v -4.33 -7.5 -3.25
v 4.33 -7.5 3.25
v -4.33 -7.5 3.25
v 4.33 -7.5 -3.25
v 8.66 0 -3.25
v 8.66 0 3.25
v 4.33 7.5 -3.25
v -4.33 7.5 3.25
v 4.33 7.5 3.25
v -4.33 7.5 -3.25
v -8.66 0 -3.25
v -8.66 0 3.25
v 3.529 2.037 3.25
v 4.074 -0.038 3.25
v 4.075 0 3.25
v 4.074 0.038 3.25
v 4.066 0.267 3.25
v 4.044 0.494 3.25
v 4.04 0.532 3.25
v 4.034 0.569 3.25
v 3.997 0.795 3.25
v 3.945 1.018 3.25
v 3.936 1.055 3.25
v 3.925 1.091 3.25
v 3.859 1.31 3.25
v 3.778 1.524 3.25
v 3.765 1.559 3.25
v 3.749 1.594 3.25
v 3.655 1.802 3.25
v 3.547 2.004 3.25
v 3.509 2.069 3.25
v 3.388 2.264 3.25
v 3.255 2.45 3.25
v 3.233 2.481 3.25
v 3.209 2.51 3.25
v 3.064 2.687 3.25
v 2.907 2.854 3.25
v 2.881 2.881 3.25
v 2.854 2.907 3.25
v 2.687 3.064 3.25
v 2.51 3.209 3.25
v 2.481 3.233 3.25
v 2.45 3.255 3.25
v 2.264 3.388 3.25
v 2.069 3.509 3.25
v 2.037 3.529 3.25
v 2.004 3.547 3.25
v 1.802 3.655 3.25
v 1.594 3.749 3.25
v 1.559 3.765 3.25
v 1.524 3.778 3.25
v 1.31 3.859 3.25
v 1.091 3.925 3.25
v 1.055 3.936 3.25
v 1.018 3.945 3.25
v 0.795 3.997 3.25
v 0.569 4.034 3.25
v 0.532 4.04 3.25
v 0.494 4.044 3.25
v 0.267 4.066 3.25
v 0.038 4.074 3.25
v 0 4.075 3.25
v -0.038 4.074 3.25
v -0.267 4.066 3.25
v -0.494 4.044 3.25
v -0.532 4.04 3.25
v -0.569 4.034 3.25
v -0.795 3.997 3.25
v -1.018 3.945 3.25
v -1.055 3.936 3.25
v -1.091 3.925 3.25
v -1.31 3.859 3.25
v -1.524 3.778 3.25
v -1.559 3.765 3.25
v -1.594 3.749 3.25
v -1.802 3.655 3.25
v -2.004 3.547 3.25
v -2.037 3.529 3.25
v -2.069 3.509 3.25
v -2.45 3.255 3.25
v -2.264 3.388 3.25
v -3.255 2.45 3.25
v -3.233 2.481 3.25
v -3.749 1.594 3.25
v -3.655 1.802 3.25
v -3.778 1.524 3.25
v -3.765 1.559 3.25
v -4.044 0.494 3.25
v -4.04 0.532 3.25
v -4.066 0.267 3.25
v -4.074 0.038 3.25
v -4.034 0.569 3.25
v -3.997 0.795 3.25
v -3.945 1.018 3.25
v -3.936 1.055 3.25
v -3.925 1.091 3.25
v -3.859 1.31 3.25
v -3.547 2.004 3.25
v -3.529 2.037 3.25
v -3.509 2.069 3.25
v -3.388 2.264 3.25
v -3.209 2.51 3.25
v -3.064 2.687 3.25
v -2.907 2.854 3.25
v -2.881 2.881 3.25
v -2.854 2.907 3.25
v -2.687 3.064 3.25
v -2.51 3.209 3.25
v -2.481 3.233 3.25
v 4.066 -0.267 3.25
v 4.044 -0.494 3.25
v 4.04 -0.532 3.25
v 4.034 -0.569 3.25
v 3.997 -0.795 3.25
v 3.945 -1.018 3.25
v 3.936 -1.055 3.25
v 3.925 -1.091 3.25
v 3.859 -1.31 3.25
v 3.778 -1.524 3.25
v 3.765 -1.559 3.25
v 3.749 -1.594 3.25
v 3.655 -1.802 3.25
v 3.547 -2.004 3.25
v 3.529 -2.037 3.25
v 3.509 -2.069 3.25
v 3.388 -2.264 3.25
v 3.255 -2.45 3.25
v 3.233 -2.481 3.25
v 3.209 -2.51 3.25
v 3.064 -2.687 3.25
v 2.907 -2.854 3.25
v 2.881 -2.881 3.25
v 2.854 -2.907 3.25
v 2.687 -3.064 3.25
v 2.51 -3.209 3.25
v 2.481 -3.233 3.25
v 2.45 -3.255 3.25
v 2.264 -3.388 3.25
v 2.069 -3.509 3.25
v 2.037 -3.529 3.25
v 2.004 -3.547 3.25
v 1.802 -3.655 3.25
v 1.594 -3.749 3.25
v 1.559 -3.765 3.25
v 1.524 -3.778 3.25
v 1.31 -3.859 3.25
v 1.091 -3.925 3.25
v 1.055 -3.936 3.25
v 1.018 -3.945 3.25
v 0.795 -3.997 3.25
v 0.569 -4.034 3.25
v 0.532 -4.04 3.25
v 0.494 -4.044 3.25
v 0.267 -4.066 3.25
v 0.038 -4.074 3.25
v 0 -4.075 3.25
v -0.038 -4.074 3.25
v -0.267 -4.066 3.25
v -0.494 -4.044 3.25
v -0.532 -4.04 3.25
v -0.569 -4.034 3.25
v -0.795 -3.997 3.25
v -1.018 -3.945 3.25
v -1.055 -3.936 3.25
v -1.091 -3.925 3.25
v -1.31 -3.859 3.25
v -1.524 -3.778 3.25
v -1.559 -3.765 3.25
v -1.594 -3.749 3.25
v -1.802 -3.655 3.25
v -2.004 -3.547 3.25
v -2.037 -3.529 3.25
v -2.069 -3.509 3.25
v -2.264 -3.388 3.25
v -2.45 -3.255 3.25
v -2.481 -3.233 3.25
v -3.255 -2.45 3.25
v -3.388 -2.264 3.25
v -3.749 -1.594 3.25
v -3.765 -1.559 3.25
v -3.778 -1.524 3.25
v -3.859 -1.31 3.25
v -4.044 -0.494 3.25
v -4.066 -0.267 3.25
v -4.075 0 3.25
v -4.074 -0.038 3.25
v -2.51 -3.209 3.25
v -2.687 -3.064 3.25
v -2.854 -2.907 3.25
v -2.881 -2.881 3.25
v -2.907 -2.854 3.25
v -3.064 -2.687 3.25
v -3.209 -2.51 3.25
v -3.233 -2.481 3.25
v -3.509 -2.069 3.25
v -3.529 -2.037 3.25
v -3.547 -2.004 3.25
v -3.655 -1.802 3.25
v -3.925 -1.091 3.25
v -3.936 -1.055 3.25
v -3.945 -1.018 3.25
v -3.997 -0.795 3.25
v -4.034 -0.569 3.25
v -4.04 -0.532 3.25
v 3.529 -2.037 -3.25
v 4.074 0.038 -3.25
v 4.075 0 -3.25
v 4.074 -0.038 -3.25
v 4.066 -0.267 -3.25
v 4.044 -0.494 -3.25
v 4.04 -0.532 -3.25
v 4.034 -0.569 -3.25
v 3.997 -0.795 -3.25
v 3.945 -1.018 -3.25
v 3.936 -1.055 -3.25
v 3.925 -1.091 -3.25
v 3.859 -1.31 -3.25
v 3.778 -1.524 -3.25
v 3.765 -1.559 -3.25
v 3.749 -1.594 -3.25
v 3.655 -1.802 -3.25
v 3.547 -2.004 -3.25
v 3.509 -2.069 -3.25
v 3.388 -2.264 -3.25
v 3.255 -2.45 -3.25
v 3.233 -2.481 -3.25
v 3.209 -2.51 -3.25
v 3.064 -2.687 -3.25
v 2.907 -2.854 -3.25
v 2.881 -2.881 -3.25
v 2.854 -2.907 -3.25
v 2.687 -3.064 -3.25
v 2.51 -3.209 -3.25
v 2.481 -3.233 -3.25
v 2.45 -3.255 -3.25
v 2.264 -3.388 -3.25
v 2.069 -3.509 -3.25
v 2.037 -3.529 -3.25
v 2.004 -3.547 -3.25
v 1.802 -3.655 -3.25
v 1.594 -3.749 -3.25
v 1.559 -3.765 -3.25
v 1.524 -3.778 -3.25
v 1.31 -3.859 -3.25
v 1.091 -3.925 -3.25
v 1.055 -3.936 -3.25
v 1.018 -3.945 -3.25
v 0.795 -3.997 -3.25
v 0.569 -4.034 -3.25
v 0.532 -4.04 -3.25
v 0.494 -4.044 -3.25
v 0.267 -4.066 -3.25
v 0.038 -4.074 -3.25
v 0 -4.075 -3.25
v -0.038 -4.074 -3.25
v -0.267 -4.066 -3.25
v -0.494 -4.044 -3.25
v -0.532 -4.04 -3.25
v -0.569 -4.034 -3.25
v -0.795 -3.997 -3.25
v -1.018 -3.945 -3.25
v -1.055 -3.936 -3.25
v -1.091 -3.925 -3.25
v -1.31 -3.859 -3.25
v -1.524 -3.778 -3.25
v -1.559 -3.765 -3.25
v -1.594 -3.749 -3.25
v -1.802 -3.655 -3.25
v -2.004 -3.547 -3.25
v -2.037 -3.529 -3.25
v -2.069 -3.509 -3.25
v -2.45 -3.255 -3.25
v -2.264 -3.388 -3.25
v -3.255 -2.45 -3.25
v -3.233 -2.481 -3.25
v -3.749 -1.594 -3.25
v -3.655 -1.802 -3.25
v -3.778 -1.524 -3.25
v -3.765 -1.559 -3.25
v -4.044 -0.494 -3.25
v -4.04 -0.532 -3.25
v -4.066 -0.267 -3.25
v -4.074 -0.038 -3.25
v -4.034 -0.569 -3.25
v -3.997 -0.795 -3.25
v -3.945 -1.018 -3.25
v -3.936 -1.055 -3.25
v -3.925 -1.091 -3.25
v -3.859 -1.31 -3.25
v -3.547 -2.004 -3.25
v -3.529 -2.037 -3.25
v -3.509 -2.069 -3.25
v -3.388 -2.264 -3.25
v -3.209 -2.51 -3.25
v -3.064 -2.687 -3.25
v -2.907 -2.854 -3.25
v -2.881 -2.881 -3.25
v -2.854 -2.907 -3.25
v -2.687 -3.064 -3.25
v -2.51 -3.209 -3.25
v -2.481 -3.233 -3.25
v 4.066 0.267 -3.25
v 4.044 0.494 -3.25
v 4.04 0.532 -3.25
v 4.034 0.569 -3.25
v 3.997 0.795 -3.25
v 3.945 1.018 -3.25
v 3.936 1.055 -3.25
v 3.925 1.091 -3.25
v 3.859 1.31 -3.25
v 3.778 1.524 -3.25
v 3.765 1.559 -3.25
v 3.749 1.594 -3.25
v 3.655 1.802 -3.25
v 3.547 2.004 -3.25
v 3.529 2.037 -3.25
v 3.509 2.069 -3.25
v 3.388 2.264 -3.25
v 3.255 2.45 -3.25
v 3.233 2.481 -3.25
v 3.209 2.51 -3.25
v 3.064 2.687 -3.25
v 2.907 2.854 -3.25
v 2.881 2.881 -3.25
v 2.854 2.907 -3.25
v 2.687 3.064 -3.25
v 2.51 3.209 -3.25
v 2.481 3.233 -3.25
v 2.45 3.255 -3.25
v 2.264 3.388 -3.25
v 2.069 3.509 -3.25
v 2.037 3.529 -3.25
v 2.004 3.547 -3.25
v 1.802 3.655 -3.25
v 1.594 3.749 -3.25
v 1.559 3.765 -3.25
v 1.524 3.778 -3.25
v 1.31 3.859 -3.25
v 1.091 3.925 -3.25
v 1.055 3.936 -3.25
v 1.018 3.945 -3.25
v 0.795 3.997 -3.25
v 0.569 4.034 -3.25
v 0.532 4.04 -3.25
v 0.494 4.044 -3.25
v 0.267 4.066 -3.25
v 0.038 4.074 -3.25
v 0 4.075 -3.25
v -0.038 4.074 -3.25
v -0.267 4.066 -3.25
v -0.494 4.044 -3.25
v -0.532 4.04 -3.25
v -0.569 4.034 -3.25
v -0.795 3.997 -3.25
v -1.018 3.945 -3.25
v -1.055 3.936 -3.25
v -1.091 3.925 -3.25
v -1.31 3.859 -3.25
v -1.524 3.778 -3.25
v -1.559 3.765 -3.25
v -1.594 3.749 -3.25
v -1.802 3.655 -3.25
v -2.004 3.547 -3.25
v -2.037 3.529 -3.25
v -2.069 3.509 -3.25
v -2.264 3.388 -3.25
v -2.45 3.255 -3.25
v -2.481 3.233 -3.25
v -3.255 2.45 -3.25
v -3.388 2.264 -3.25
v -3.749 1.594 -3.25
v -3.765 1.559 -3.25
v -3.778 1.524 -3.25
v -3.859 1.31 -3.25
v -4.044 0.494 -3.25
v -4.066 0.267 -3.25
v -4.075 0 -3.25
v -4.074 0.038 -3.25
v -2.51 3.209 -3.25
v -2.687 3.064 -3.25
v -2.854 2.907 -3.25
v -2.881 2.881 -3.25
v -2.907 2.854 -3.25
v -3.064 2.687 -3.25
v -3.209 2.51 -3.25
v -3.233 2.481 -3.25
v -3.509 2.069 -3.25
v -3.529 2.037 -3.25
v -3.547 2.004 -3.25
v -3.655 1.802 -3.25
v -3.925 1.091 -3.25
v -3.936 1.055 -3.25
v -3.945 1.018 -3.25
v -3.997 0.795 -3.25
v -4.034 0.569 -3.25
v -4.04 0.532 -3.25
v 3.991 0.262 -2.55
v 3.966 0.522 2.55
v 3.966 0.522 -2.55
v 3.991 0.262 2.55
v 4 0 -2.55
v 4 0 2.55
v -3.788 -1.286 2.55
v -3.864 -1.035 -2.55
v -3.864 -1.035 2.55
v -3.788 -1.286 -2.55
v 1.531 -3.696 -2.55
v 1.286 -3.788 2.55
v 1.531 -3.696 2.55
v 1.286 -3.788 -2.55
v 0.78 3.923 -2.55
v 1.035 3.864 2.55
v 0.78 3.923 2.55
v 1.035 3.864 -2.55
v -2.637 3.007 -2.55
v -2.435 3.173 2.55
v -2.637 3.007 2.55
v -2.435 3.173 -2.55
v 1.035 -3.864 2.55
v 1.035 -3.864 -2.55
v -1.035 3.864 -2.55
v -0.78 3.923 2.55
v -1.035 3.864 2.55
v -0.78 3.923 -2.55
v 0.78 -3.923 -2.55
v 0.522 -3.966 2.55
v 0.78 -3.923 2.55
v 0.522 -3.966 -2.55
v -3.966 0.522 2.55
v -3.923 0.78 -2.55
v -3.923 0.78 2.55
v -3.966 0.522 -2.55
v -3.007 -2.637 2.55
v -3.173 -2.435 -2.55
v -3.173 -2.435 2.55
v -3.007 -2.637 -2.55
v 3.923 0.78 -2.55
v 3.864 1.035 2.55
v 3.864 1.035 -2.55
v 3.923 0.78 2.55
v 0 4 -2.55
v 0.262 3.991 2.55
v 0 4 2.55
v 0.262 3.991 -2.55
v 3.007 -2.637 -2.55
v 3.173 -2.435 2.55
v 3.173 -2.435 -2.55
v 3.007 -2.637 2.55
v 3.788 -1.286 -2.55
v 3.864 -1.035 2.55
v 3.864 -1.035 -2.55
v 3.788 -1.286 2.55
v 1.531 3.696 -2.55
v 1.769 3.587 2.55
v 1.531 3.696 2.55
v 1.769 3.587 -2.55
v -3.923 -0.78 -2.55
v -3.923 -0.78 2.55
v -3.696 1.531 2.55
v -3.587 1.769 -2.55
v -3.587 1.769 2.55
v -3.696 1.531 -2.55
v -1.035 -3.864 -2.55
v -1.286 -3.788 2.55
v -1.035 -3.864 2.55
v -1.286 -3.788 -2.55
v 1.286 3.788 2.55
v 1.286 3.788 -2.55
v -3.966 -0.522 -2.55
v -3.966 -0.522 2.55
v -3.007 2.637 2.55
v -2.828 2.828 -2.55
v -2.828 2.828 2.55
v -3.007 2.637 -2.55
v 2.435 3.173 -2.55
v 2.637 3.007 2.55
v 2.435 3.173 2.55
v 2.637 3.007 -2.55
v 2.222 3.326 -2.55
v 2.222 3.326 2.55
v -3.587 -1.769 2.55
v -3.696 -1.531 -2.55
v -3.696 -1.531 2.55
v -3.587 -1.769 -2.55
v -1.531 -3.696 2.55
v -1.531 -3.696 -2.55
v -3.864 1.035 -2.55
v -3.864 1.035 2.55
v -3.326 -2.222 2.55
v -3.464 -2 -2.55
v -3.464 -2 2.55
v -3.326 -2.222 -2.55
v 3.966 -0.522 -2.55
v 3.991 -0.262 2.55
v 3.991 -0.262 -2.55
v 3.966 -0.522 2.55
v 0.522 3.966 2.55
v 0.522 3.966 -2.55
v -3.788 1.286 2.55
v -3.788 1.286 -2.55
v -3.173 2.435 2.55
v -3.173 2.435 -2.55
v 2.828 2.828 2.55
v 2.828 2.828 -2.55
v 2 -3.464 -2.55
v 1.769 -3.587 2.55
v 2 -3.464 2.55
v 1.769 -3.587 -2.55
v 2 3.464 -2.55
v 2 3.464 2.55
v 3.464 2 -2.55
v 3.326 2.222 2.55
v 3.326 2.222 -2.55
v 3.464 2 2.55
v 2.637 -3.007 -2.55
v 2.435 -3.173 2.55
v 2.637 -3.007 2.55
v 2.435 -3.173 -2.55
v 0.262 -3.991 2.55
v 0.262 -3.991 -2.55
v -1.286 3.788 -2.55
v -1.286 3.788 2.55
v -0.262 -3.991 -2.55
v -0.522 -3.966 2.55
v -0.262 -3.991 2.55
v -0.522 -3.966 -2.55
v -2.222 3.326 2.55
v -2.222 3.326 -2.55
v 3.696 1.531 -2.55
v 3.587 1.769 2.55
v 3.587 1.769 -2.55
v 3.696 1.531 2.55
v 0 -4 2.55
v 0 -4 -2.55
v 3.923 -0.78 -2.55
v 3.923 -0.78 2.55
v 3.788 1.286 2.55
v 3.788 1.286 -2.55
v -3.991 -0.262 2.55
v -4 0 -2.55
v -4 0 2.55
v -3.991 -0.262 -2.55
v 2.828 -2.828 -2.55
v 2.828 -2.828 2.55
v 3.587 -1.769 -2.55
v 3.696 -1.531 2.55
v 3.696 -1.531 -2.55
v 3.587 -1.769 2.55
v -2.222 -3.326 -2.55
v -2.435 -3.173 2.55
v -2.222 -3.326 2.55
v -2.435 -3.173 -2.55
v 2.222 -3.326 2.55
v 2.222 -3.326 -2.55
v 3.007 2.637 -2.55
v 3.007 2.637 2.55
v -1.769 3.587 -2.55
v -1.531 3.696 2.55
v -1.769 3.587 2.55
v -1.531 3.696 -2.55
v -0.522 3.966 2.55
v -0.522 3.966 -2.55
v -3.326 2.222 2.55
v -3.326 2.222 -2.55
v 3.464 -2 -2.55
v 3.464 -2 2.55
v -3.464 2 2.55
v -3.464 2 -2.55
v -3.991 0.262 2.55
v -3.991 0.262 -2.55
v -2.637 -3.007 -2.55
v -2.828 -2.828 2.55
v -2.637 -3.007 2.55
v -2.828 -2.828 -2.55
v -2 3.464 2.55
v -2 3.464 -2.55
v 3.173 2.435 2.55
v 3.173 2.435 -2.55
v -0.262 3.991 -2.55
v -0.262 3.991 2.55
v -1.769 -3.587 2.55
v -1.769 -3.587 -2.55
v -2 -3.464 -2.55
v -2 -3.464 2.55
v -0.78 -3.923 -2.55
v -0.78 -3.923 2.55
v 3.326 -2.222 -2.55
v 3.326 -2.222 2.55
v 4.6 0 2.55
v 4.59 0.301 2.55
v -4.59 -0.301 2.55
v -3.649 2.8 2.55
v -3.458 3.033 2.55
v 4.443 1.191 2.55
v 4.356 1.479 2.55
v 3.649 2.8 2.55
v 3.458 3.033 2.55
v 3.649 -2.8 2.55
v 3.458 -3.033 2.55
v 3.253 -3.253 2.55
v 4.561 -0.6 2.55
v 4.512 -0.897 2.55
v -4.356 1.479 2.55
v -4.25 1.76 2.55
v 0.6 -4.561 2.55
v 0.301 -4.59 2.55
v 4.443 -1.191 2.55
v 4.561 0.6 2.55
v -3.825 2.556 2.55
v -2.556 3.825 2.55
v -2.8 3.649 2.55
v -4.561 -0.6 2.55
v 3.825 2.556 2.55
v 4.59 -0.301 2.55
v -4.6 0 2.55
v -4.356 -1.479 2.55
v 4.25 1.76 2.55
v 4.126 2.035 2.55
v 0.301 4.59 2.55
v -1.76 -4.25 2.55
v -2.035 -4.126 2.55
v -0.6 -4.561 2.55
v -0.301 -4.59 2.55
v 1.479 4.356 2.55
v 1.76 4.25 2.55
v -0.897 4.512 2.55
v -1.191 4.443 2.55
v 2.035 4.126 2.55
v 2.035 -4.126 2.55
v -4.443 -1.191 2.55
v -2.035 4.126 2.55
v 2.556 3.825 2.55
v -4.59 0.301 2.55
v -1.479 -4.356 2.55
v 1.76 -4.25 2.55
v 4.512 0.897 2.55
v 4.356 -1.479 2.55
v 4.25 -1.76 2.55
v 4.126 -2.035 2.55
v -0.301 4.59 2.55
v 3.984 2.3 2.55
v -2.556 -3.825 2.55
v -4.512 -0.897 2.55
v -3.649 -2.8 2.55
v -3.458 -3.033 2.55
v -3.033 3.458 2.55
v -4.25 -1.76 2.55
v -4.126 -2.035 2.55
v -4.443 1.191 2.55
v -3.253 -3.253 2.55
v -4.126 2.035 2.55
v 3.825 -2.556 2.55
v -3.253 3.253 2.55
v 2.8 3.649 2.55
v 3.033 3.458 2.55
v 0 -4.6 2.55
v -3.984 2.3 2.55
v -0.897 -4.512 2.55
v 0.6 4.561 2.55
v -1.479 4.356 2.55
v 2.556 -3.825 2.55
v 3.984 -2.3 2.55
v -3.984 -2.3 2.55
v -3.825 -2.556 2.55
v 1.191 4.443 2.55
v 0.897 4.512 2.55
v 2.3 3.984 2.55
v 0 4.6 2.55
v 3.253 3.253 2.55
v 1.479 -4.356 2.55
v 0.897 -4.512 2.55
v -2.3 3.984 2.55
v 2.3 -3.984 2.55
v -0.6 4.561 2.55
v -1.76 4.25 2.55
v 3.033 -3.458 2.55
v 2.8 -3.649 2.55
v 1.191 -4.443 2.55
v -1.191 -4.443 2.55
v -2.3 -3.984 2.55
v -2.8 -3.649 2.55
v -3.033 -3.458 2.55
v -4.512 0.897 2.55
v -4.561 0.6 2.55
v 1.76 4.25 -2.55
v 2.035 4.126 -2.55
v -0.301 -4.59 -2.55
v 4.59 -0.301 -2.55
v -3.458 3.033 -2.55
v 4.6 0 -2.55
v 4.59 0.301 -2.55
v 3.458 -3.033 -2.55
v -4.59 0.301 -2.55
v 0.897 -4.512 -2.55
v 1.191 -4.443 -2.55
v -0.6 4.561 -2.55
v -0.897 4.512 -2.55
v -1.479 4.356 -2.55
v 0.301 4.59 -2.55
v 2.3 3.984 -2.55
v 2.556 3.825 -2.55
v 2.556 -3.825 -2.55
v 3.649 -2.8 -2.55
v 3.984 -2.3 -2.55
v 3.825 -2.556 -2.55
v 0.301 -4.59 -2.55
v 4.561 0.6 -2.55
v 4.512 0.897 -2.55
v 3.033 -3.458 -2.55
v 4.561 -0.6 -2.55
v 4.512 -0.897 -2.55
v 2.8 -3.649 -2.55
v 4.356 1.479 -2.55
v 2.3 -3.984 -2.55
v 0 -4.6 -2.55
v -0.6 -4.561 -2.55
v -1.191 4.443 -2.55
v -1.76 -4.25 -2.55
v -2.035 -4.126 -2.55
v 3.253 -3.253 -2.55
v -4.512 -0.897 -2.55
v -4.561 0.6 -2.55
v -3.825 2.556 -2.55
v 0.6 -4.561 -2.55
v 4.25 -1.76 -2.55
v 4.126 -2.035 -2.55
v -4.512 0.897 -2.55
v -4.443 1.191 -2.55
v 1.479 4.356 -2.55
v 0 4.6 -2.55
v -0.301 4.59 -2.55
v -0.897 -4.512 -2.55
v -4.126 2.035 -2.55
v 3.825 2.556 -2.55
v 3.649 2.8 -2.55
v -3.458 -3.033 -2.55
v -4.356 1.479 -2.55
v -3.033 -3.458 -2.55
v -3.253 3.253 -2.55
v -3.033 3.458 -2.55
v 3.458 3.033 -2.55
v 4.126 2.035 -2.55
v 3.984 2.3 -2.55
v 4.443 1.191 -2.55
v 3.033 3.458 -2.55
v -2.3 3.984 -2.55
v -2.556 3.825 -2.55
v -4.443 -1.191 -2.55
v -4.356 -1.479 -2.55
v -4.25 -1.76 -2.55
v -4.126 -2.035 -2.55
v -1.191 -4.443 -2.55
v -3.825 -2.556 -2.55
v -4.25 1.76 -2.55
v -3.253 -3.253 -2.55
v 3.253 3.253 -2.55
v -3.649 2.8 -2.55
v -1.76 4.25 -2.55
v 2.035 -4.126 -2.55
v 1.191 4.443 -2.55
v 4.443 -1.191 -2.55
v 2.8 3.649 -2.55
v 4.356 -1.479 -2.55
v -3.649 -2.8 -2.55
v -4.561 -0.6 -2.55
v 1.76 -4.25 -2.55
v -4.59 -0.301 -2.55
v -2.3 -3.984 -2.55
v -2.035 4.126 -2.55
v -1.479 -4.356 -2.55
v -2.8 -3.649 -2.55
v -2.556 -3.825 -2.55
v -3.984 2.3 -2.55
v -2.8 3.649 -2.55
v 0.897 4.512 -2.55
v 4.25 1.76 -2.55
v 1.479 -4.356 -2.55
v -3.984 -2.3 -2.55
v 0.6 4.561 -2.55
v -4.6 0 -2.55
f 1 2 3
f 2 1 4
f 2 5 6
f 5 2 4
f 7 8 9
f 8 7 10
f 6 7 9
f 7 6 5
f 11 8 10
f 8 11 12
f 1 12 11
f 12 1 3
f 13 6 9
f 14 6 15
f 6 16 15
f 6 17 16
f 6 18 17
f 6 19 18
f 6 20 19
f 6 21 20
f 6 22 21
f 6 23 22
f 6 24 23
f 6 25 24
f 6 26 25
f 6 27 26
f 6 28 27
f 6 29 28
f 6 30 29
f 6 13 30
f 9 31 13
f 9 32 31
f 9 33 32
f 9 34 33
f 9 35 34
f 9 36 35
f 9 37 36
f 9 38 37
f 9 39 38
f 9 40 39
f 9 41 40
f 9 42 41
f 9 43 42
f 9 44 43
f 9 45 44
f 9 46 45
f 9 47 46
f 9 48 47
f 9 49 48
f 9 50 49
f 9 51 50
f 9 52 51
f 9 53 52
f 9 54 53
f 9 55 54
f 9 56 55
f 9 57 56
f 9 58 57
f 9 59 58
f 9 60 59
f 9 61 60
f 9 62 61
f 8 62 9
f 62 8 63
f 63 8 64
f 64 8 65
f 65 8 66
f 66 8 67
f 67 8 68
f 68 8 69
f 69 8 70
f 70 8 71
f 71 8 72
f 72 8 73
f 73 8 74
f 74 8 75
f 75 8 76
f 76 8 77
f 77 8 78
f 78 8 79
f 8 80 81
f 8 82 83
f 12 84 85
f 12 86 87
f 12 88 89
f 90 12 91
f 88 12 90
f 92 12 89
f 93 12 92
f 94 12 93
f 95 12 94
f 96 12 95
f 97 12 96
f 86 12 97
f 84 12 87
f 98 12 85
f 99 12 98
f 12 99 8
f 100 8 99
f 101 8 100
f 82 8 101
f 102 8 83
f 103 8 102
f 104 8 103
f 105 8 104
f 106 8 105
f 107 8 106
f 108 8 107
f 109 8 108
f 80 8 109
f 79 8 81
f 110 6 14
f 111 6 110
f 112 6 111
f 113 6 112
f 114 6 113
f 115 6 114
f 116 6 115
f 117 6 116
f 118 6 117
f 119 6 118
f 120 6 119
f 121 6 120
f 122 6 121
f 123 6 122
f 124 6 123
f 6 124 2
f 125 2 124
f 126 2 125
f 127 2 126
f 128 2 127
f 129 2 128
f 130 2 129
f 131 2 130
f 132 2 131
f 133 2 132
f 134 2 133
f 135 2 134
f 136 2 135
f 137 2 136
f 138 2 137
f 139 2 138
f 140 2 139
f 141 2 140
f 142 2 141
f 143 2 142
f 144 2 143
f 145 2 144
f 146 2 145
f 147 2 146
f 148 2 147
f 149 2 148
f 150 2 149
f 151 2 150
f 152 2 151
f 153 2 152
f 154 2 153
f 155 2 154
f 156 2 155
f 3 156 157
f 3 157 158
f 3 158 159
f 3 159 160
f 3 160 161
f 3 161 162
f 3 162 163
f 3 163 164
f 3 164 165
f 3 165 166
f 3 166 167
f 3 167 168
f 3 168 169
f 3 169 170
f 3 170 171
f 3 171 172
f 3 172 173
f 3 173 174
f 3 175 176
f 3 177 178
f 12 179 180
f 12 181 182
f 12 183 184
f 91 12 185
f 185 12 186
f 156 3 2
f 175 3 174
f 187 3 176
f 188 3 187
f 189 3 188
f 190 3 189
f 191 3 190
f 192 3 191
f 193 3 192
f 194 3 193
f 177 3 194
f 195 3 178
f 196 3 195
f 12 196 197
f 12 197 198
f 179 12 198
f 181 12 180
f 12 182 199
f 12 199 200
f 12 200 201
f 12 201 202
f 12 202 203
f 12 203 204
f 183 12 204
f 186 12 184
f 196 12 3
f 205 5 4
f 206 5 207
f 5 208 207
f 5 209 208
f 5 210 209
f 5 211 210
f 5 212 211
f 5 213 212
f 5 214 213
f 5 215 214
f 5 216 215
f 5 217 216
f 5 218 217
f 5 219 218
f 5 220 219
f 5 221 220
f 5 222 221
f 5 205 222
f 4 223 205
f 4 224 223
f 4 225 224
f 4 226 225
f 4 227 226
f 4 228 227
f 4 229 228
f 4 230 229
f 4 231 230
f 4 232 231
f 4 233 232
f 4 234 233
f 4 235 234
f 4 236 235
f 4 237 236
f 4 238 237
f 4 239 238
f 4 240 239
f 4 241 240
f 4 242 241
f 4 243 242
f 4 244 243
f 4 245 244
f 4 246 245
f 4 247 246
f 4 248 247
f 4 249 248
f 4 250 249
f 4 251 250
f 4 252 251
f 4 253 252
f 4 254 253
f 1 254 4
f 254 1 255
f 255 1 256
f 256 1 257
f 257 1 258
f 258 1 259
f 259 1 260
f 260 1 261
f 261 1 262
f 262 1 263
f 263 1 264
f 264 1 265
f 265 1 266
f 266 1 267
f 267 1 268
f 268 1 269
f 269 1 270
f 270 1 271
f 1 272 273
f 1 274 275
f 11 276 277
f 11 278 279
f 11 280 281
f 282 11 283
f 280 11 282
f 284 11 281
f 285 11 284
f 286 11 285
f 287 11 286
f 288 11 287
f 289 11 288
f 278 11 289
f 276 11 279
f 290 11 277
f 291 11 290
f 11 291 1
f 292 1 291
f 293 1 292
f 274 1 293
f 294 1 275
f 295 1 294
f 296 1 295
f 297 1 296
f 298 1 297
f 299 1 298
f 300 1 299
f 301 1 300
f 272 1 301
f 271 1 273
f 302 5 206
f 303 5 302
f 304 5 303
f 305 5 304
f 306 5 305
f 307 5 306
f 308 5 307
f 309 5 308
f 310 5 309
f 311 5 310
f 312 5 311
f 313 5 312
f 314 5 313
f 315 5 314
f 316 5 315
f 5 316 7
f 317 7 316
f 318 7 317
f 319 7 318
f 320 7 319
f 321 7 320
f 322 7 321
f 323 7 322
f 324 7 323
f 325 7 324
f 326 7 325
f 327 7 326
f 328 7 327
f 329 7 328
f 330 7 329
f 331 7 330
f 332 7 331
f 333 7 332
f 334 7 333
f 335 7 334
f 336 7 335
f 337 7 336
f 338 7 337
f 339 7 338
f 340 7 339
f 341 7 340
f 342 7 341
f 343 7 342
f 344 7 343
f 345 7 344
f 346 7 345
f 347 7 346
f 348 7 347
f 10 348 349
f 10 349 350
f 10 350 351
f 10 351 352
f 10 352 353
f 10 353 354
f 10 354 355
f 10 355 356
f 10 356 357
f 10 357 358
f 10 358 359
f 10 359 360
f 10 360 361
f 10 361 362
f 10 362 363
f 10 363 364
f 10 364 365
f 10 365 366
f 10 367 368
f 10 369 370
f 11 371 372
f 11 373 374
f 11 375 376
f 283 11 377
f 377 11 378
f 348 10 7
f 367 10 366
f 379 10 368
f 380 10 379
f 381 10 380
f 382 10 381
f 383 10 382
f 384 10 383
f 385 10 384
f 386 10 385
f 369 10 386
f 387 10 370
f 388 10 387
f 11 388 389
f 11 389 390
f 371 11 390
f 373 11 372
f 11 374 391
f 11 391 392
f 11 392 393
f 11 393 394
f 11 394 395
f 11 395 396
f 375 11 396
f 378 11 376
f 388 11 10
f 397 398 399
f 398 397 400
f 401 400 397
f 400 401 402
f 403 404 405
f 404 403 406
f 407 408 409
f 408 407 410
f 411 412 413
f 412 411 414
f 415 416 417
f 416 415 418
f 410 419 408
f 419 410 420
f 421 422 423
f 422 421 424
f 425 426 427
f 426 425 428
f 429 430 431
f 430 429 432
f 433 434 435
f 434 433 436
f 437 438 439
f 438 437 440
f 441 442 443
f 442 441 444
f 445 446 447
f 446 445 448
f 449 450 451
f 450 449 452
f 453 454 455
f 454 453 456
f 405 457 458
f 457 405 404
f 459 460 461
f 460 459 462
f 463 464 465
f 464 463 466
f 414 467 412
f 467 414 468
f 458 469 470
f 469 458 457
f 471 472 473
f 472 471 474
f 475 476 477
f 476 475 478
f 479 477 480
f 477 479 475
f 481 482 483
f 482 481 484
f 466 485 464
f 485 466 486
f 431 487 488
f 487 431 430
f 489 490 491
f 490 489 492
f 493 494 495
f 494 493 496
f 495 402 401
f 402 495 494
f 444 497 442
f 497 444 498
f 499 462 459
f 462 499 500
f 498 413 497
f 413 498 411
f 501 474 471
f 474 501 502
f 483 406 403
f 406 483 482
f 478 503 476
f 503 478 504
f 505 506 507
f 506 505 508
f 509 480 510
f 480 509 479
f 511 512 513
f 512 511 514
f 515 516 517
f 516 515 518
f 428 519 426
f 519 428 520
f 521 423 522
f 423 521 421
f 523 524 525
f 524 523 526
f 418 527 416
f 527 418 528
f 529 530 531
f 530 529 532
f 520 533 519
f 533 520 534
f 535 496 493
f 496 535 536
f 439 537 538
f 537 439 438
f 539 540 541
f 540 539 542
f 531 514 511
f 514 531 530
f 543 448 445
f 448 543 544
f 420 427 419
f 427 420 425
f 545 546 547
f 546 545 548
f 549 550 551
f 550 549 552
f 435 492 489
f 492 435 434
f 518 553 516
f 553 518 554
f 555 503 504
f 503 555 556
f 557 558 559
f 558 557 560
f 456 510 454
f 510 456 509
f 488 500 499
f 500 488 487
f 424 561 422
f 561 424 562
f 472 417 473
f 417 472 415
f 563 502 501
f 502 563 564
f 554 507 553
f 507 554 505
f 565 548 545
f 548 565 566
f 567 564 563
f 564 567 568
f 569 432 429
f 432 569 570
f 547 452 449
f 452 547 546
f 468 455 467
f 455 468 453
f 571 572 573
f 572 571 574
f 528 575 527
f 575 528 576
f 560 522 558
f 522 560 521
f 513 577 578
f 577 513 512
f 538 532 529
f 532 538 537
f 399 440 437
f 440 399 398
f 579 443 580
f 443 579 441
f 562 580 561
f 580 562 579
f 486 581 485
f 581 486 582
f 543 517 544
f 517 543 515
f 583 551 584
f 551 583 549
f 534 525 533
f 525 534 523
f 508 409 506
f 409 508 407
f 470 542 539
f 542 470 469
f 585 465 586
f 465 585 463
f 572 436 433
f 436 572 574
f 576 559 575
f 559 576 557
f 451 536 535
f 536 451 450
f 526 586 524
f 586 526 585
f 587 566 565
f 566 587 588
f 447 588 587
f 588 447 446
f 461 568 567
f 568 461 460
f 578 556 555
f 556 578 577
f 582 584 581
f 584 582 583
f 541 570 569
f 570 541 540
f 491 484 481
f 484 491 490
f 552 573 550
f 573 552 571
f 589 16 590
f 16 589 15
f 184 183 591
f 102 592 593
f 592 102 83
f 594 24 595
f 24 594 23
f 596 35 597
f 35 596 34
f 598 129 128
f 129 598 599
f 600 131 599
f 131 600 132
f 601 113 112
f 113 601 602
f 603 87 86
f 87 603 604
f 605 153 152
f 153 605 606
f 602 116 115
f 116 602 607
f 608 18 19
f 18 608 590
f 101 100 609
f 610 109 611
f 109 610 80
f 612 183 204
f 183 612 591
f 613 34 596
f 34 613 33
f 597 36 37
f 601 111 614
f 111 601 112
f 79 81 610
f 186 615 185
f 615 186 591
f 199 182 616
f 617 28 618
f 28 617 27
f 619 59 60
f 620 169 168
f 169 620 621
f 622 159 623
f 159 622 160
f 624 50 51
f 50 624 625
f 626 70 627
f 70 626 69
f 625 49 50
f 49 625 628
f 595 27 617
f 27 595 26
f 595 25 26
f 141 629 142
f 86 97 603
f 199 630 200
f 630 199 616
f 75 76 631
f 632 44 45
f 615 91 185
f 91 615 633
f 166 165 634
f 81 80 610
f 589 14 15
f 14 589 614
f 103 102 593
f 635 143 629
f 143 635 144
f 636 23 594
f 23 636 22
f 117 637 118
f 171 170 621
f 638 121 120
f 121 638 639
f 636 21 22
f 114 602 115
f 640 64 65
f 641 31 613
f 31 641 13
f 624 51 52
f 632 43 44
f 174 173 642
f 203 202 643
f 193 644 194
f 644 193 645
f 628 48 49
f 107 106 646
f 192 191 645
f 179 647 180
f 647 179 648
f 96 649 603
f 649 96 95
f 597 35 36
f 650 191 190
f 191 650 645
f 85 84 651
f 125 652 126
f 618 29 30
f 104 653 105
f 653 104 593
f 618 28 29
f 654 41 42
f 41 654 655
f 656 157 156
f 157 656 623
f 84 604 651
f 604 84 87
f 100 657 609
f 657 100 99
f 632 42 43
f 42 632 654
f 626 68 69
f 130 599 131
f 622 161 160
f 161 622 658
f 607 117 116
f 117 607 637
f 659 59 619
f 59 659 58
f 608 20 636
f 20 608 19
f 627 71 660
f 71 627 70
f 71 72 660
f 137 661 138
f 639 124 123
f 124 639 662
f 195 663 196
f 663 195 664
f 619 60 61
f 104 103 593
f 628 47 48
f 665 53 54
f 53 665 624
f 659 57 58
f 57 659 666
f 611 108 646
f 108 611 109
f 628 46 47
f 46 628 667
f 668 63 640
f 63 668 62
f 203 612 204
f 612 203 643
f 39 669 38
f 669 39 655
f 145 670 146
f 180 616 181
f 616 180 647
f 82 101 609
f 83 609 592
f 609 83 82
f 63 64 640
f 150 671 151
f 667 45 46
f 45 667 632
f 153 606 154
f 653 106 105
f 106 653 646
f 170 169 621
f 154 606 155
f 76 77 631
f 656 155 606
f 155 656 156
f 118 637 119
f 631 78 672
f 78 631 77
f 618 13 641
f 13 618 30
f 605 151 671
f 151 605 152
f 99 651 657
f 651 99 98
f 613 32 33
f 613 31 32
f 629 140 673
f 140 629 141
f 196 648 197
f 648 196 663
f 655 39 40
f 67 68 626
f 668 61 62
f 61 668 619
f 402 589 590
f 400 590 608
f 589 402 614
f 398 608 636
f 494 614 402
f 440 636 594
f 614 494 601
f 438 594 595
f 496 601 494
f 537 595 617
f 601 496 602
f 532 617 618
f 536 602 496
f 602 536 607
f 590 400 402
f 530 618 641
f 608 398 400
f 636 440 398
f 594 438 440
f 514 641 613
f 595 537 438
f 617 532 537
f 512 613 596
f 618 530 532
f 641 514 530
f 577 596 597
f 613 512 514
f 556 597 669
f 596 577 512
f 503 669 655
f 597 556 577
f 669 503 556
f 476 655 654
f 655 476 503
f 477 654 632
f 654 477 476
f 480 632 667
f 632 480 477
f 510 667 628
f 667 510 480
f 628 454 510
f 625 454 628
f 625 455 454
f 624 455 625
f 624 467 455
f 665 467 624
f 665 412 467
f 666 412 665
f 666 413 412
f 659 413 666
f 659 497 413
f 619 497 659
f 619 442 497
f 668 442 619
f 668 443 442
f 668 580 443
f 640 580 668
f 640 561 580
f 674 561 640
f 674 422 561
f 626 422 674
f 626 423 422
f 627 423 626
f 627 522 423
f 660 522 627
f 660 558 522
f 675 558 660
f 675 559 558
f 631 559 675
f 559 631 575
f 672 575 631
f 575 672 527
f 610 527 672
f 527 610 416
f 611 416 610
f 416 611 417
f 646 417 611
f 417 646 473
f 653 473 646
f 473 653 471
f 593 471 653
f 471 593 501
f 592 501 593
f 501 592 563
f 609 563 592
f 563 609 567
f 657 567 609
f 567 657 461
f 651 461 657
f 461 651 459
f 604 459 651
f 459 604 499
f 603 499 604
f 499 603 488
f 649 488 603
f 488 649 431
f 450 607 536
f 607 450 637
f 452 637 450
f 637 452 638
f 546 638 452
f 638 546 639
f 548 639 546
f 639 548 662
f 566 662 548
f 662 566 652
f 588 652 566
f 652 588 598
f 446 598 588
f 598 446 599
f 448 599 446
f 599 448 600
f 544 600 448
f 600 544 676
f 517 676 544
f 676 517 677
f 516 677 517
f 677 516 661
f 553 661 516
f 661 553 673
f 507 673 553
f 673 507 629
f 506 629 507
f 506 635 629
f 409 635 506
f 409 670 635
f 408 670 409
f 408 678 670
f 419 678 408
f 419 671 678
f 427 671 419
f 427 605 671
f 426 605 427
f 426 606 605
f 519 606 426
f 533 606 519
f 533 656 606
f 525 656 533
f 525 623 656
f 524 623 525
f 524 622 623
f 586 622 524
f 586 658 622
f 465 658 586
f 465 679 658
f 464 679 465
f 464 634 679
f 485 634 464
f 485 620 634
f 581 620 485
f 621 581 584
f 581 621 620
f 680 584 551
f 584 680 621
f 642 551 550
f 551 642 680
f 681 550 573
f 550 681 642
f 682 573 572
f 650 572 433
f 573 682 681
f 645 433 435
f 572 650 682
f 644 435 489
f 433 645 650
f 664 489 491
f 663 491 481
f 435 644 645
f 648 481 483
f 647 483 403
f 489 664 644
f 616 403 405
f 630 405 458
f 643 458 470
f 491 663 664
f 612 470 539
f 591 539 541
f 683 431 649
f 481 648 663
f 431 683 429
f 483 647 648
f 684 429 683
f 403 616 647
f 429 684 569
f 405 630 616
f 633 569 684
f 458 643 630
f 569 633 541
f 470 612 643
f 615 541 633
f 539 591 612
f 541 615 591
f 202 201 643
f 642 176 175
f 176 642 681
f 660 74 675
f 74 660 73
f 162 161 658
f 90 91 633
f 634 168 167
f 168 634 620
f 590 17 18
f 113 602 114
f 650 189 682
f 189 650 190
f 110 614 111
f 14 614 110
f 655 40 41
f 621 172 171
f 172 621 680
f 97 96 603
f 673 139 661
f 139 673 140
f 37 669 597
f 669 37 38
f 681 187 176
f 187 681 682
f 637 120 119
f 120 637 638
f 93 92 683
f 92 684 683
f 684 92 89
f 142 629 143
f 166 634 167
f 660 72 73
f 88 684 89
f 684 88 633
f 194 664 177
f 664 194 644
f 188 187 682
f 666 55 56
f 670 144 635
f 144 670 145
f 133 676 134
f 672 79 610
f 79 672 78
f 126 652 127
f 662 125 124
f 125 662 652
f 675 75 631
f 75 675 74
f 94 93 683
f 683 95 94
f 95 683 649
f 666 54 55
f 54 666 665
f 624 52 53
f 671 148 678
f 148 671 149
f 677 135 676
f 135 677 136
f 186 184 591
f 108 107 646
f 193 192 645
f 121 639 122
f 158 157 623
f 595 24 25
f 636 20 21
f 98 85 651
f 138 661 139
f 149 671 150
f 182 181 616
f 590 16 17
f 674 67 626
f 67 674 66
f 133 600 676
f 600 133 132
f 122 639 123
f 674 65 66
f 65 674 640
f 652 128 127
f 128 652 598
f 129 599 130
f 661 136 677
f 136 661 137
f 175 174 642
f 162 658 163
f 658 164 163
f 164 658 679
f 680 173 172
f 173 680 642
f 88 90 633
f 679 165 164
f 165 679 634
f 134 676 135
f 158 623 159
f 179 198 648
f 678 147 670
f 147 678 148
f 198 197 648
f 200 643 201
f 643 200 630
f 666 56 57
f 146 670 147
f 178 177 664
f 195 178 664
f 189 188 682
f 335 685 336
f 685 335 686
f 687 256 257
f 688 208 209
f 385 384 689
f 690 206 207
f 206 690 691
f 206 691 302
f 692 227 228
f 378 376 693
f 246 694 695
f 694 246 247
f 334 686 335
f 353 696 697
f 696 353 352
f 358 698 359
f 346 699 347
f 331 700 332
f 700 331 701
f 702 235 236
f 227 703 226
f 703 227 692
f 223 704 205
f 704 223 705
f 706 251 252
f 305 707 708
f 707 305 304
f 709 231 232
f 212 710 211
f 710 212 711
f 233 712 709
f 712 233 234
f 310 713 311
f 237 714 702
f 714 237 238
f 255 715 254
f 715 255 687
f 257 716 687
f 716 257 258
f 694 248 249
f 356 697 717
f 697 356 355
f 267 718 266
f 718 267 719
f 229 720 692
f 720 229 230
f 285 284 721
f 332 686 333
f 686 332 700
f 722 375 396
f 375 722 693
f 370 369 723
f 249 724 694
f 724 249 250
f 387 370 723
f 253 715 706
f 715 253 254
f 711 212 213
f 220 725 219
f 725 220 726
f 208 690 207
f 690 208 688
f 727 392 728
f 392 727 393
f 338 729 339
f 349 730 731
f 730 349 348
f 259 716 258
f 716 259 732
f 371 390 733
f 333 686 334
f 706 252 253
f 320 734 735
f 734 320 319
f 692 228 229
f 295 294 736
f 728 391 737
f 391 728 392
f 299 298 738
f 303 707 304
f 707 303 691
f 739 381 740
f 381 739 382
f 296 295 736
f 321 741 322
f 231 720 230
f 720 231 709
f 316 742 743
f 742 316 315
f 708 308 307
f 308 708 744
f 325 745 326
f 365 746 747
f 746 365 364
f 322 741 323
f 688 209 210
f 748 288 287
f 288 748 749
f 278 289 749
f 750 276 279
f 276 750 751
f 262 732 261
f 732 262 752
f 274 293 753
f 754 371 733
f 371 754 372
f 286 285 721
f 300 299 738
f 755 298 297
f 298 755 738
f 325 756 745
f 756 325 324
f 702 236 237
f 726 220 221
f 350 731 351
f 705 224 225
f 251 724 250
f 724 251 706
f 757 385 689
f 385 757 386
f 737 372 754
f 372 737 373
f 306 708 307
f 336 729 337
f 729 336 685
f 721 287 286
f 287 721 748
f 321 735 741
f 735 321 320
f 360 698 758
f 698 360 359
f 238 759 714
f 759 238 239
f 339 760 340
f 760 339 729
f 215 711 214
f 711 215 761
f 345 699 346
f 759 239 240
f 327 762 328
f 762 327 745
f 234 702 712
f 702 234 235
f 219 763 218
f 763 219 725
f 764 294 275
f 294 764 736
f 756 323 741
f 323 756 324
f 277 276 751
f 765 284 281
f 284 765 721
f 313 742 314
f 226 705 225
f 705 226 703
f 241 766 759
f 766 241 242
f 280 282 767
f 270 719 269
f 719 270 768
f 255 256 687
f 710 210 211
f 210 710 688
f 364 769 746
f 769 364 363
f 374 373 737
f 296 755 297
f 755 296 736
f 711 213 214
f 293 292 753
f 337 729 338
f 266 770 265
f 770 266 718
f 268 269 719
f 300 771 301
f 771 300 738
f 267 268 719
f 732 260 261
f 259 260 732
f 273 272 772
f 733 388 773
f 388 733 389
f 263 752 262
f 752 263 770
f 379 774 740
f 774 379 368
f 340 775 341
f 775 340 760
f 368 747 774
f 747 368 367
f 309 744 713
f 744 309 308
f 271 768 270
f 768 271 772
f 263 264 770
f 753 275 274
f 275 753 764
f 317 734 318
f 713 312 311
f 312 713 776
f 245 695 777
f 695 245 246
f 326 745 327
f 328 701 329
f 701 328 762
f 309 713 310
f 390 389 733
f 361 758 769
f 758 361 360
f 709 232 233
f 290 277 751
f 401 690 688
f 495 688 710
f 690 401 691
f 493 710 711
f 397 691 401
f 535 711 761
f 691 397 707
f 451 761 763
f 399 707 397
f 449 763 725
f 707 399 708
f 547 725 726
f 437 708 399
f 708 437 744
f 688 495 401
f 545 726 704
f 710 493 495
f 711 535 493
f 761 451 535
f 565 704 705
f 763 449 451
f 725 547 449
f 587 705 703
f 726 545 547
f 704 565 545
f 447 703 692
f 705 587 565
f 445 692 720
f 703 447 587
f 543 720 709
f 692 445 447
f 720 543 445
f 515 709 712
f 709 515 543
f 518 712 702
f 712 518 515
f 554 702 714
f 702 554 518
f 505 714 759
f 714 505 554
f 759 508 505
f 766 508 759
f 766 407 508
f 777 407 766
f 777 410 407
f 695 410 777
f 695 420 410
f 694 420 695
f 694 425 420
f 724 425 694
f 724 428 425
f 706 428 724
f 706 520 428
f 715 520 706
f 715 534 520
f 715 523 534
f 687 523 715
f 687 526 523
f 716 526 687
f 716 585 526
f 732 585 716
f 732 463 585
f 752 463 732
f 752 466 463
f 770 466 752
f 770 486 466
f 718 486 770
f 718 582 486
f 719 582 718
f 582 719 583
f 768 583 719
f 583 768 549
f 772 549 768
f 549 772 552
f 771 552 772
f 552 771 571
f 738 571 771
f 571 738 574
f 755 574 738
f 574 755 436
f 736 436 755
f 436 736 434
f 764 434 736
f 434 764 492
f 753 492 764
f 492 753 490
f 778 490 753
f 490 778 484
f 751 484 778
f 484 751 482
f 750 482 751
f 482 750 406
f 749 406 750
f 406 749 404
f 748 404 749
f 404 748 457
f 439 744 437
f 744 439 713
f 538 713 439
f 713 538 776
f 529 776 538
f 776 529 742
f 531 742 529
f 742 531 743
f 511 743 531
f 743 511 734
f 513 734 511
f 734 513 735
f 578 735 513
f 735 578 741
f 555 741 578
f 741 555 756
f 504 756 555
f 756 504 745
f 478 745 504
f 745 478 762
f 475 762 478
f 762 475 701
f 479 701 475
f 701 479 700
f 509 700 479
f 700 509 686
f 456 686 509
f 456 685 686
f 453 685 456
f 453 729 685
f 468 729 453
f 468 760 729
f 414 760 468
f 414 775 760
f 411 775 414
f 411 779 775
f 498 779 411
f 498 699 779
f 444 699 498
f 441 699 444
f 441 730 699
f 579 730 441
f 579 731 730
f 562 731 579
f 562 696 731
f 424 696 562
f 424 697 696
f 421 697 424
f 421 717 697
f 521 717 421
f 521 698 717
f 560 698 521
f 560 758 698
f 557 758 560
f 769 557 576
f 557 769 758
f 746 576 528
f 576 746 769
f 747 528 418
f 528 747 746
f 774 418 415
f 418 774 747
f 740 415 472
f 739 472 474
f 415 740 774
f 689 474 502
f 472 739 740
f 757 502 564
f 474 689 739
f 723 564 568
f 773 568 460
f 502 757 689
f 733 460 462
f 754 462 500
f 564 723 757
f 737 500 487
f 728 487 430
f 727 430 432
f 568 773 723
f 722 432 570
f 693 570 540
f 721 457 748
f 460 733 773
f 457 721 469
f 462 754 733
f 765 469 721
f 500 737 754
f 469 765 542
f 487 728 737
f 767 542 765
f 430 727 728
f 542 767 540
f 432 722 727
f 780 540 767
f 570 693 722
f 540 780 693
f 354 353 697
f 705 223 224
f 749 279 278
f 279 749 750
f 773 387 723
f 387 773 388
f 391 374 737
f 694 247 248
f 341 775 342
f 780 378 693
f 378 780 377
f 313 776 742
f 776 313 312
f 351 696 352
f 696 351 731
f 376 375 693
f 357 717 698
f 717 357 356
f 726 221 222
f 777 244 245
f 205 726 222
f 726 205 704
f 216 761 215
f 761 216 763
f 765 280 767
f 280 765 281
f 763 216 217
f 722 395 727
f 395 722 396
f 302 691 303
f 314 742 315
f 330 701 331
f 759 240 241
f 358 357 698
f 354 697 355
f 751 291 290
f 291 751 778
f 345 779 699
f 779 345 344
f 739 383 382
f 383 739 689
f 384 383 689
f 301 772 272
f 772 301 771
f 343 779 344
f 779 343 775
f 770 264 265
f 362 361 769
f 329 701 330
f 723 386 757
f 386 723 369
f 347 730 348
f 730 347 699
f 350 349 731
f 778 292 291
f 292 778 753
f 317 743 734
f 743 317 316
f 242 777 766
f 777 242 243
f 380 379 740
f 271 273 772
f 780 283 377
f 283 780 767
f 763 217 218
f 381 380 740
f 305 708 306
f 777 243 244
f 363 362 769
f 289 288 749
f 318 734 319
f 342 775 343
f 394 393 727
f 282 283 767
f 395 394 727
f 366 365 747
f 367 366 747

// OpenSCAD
$fn = 96;

// Target dimensions
across_flats = 15.0;   // mm
thickness    = 6.5;    // mm
bore_d       = 8.0;    // mm (clearance/nominal as requested)

// Edge detail (simple lead-in chamfers)
chamfer_h = 0.6;       // mm
chamfer_w = 0.6;       // mm
overlap   = 0.2;       // mm (boolean robustness)

// Derived
bore_r = bore_d/2;
hex_R  = across_flats / sqrt(3); // circumradius for a hex with given across-flats

module hex_prism(af, h) {
    R = af / sqrt(3);
    cylinder(h=h, r=R, center=true, $fn=6);
}

module hex_nut(af, h, hole_d, ch_h, ch_w) {
    hole_r = hole_d/2;

    difference() {
        // Body
        hex_prism(af, h);

        // Through hole
        cylinder(h=h + 2*overlap, r=hole_r, center=true);

        // Top lead-in chamfer (wider at the face, tapering to hole)
        translate([0, 0,  h/2 - ch_h/2])
            cylinder(h=ch_h + overlap, r1=hole_r + ch_w, r2=hole_r, center=true);

        // Bottom lead-in chamfer
        translate([0, 0, -h/2 + ch_h/2])
            cylinder(h=ch_h + overlap, r1=hole_r, r2=hole_r + ch_w, center=true);
    }
}

// Render: ONE connected solid (a single nut body with a central hole)
color("Silver")
hex_nut(across_flats, thickness, bore_d, chamfer_h, chamfer_w);
